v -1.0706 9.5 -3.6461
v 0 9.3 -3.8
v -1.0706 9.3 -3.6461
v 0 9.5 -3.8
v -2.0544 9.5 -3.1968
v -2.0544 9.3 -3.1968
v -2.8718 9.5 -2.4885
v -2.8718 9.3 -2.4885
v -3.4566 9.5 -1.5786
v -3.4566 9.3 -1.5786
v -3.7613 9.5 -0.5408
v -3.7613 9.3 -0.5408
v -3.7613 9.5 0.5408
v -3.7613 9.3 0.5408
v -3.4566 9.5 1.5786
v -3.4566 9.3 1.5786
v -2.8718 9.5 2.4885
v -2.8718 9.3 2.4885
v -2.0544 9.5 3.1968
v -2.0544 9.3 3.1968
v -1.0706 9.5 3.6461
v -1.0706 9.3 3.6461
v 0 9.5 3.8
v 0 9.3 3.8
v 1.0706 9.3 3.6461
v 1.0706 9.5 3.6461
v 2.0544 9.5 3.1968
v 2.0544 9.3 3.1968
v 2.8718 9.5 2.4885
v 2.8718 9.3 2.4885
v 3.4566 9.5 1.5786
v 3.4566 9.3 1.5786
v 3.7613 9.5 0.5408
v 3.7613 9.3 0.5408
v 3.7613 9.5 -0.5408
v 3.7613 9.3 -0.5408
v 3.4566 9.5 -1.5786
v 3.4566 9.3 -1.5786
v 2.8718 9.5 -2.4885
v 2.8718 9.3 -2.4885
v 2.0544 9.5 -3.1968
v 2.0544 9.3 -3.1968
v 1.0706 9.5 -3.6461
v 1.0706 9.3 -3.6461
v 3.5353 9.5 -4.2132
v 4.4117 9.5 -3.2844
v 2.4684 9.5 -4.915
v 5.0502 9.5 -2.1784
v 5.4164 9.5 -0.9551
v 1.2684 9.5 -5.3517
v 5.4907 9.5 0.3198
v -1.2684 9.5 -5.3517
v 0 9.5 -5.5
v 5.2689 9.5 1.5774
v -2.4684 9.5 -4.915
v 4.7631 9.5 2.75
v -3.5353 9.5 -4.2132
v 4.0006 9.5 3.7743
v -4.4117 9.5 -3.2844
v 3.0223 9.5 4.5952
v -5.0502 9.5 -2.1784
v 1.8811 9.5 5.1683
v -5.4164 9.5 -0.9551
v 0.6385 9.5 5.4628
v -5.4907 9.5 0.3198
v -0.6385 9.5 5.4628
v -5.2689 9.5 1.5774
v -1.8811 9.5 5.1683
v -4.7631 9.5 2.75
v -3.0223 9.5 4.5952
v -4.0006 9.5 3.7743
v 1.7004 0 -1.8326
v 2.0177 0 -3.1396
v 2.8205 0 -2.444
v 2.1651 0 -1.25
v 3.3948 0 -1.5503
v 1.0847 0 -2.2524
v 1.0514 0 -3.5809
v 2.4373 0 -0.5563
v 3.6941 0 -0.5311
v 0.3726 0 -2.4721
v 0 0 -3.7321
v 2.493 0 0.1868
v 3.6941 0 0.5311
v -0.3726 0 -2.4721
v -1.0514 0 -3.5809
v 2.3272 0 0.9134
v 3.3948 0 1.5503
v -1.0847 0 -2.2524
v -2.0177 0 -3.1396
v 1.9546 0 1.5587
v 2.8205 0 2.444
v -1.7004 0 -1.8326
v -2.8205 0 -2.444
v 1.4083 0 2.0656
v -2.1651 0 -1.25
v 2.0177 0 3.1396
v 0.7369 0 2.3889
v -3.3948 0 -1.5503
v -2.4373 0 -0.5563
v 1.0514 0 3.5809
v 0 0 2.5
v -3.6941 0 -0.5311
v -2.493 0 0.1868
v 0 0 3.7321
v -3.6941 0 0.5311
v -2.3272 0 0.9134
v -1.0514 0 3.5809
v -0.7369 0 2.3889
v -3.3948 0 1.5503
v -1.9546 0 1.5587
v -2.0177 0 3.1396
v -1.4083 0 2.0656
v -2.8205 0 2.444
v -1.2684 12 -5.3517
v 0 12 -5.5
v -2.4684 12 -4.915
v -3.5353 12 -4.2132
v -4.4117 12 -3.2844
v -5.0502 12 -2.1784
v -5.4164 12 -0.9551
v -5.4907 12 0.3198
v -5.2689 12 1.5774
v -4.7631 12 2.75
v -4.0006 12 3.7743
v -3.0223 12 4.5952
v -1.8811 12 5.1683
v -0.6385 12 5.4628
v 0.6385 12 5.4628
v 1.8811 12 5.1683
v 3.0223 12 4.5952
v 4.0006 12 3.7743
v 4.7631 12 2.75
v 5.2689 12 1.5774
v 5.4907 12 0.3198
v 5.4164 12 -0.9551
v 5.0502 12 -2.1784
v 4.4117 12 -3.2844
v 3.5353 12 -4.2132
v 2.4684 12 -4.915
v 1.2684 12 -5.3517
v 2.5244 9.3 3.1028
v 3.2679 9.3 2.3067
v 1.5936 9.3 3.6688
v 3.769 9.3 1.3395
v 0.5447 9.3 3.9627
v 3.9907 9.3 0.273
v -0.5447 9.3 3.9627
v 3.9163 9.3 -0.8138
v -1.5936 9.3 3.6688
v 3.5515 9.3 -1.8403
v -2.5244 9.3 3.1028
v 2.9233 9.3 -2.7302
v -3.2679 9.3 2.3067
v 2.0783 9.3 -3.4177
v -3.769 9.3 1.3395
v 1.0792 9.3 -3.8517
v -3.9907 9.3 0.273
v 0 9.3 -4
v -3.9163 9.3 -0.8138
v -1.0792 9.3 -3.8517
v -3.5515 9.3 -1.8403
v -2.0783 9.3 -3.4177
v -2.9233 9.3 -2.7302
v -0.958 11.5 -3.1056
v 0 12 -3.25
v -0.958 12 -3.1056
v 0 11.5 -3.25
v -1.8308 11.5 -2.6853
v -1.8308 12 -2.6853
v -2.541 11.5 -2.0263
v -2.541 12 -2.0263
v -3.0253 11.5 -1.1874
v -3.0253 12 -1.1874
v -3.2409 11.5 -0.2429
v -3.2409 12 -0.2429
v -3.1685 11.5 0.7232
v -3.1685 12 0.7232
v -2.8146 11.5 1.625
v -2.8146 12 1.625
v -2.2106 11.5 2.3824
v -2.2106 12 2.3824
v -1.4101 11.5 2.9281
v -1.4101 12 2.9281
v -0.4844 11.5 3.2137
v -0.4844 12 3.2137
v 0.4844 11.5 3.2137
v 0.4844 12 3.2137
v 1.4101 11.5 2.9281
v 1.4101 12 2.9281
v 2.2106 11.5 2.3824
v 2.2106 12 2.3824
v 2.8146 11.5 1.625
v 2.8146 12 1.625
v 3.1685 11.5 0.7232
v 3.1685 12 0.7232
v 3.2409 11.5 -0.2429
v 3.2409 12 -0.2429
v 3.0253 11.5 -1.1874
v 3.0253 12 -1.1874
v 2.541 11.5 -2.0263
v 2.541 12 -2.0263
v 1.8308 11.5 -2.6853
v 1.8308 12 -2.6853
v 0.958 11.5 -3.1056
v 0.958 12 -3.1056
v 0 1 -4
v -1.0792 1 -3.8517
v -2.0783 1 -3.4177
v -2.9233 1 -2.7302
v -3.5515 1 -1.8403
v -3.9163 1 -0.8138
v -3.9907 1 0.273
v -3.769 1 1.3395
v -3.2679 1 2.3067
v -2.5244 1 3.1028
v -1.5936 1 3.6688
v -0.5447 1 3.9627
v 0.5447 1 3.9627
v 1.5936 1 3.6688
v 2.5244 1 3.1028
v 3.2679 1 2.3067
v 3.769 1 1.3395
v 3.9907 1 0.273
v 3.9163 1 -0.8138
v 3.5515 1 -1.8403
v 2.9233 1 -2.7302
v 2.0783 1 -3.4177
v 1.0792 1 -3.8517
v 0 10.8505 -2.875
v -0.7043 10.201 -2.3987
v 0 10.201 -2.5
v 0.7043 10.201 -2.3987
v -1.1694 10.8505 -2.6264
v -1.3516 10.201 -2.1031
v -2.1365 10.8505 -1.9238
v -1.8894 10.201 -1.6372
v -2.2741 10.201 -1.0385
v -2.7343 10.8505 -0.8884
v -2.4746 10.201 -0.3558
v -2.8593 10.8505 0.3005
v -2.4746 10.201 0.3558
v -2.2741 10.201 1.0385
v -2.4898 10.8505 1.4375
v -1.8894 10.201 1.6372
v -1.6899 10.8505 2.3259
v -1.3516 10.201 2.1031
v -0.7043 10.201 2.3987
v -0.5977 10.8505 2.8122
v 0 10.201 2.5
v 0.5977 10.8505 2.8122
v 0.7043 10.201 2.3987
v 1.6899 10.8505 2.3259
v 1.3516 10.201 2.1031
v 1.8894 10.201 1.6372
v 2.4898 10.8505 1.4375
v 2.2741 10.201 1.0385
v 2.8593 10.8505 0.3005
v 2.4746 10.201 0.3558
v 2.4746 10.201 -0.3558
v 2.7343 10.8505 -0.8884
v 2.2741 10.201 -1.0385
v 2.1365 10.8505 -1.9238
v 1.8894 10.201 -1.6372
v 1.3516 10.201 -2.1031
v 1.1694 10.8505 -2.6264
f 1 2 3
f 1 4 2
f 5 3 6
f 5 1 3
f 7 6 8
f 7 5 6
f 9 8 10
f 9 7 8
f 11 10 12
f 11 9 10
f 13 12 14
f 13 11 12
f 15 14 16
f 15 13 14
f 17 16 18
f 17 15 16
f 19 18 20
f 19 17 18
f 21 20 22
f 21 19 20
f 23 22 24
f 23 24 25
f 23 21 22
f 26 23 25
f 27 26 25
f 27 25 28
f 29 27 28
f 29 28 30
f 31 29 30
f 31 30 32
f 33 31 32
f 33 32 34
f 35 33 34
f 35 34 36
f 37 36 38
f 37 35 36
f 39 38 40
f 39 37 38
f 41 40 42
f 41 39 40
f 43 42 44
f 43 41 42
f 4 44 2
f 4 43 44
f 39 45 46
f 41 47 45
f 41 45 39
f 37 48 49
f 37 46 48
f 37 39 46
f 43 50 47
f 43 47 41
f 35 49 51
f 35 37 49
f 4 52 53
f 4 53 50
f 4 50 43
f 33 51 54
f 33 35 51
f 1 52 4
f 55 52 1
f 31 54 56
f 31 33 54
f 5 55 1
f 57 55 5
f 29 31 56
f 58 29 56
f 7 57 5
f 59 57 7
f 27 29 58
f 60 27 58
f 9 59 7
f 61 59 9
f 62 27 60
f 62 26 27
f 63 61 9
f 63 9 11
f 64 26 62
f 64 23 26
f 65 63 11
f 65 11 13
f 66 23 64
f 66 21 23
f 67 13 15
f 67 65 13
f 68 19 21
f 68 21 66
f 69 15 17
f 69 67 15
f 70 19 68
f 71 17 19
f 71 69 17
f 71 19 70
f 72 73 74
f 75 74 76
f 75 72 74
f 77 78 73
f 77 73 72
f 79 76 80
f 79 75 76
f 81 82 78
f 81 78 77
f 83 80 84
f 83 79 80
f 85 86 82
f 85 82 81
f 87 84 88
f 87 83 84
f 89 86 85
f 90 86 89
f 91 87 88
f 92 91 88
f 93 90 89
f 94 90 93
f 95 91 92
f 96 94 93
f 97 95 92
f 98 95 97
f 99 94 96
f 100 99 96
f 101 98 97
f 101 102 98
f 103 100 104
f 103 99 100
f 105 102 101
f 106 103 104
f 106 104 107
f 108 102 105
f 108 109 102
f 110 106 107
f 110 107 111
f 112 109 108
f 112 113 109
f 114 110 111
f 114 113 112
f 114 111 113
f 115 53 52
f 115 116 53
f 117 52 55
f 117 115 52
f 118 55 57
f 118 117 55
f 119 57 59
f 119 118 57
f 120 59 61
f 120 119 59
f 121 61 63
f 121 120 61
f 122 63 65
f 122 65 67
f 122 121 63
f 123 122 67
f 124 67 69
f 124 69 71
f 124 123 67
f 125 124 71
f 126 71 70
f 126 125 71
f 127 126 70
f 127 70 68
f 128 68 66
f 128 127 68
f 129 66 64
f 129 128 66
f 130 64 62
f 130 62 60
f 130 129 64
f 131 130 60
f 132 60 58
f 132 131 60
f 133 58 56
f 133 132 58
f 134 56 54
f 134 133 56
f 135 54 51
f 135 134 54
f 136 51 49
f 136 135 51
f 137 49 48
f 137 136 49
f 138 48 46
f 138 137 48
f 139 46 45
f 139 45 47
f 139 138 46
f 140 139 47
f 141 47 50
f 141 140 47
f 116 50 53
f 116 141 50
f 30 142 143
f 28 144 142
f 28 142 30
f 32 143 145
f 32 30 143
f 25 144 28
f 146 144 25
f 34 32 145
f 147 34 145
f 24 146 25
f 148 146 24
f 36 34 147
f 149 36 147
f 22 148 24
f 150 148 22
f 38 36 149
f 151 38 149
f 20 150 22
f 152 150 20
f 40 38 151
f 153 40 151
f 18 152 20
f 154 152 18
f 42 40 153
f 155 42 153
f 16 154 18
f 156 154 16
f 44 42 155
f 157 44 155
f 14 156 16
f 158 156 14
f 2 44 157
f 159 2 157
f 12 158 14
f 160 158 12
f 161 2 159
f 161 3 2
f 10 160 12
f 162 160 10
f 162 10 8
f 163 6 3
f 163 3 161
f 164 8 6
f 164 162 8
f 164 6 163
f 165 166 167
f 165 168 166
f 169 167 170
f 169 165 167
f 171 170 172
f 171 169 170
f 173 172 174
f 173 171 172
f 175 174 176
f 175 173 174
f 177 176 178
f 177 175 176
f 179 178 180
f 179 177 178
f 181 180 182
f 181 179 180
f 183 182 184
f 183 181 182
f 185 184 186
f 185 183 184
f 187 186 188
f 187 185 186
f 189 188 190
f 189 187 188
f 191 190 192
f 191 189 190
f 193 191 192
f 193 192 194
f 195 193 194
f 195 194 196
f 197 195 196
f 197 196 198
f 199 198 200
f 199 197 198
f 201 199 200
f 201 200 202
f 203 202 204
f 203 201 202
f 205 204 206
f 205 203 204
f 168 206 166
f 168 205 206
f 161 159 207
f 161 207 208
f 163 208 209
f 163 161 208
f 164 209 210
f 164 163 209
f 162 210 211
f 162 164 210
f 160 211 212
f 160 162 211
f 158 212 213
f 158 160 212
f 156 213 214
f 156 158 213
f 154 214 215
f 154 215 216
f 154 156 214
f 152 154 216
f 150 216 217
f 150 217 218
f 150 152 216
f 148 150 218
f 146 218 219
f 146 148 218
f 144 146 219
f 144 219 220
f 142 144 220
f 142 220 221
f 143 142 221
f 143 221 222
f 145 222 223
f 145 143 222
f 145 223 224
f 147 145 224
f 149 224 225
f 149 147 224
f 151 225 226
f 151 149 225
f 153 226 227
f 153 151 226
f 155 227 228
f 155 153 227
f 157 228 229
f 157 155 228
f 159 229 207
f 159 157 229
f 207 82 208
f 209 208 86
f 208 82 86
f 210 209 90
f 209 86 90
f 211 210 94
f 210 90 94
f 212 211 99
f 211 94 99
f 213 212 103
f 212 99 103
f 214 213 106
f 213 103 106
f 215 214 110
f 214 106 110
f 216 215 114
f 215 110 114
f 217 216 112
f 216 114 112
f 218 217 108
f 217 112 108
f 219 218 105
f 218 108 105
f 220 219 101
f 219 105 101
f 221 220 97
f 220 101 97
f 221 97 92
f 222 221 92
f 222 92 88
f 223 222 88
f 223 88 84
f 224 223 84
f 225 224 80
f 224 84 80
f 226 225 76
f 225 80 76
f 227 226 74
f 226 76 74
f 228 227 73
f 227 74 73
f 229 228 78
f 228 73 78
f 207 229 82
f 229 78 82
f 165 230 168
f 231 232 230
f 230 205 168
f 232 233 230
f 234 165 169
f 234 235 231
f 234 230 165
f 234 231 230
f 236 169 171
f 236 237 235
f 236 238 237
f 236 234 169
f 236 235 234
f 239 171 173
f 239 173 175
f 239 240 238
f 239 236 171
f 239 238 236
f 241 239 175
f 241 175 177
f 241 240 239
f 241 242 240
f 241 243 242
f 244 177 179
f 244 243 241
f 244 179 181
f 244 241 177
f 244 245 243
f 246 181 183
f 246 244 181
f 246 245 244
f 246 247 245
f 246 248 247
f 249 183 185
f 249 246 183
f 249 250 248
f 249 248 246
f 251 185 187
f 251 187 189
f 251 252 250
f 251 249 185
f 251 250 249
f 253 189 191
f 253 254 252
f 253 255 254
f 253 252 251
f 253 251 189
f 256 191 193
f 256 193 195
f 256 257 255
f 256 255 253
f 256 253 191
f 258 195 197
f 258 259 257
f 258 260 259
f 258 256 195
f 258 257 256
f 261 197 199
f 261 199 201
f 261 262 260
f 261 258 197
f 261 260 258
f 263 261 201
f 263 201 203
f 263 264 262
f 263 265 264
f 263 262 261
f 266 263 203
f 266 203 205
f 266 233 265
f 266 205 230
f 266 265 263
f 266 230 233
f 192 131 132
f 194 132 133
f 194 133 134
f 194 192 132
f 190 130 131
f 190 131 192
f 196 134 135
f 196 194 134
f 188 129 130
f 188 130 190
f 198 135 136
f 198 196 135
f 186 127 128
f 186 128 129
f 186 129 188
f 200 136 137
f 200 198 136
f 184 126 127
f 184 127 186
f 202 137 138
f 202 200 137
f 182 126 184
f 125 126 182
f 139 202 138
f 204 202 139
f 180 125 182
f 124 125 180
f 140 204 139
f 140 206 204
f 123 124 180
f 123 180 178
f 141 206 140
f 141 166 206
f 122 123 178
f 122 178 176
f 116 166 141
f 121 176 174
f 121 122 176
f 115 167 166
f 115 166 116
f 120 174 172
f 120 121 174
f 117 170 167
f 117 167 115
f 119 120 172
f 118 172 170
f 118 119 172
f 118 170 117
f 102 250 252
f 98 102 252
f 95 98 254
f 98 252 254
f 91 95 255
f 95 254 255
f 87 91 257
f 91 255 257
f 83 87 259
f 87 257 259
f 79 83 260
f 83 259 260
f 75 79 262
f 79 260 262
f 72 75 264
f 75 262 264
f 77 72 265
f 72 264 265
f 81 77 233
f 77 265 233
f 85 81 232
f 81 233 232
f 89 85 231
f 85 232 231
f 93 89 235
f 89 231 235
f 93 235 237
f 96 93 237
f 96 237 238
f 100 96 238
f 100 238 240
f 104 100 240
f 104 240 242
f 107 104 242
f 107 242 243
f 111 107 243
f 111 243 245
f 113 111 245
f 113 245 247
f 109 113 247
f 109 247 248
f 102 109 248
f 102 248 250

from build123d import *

# Parameters (mm, degrees)
SKETCH2_R          = 2.5
CUT_EXTRUDE1_DEPTH = 15.300349646
CHAMFER1_SIZE      = 1
CHAMFER1_SIZE2     = 0.267949192


with BuildPart() as part:
    # Sketch1 → Revolve1 (revolve)
    with BuildSketch(Plane.XY, mode=Mode.PRIVATE) as revolve1_sk:
        Polygon((0, 0), (4, 0), (4, 9.3), (3.8, 9.3), (3.8, 9.5), (5.5, 9.5), (5.5, 12), (0, 12), align=None)
    revolve(revolve1_sk.sketch.rotate(Axis((0, -5, 0), (0, 1, 0)), 90), axis=Axis((0, -5, 0), (0, 1, 0)))

    # Sketch2 → Cut-Extrude1 (cut, through all)
    with BuildSketch(Plane(origin=(0, 12, 0), x_dir=(1, 0, 0), z_dir=(0, 1, 0))):
        with Locations(Location((0, 0, 0), (0, 0, 270))):
            Circle(SKETCH2_R)
    extrude(amount=-CUT_EXTRUDE1_DEPTH, mode=Mode.SUBTRACT)

    # Chamfer1
    chamfer1_edges = [part.edges().sort_by_distance(p)[0] for p in [
        (0, 0, 4),
    ]]
    chamfer1_side = [part.faces().sort_by_distance(p)[0] for p in [
        (0, 4.65, 4),
    ]]
    chamfer(chamfer1_edges, length=CHAMFER1_SIZE, length2=CHAMFER1_SIZE2, reference=chamfer1_side[0])

    # Sketch3 → Cut-Revolve1 (revolve, cut)
    with BuildSketch(Plane.XY, mode=Mode.PRIVATE) as cut_revolve1_sk:
        Polygon((0, 12), (3.25, 12), (3.25, 11.5), (2.5, 10.200961894), (0, 10.200961894), align=None)
    revolve(cut_revolve1_sk.sketch.rotate(Axis((0, -5, 0), (0, 1, 0)), 90), axis=Axis((0, -5, 0), (0, 1, 0)), mode=Mode.SUBTRACT)


solid = part.part
